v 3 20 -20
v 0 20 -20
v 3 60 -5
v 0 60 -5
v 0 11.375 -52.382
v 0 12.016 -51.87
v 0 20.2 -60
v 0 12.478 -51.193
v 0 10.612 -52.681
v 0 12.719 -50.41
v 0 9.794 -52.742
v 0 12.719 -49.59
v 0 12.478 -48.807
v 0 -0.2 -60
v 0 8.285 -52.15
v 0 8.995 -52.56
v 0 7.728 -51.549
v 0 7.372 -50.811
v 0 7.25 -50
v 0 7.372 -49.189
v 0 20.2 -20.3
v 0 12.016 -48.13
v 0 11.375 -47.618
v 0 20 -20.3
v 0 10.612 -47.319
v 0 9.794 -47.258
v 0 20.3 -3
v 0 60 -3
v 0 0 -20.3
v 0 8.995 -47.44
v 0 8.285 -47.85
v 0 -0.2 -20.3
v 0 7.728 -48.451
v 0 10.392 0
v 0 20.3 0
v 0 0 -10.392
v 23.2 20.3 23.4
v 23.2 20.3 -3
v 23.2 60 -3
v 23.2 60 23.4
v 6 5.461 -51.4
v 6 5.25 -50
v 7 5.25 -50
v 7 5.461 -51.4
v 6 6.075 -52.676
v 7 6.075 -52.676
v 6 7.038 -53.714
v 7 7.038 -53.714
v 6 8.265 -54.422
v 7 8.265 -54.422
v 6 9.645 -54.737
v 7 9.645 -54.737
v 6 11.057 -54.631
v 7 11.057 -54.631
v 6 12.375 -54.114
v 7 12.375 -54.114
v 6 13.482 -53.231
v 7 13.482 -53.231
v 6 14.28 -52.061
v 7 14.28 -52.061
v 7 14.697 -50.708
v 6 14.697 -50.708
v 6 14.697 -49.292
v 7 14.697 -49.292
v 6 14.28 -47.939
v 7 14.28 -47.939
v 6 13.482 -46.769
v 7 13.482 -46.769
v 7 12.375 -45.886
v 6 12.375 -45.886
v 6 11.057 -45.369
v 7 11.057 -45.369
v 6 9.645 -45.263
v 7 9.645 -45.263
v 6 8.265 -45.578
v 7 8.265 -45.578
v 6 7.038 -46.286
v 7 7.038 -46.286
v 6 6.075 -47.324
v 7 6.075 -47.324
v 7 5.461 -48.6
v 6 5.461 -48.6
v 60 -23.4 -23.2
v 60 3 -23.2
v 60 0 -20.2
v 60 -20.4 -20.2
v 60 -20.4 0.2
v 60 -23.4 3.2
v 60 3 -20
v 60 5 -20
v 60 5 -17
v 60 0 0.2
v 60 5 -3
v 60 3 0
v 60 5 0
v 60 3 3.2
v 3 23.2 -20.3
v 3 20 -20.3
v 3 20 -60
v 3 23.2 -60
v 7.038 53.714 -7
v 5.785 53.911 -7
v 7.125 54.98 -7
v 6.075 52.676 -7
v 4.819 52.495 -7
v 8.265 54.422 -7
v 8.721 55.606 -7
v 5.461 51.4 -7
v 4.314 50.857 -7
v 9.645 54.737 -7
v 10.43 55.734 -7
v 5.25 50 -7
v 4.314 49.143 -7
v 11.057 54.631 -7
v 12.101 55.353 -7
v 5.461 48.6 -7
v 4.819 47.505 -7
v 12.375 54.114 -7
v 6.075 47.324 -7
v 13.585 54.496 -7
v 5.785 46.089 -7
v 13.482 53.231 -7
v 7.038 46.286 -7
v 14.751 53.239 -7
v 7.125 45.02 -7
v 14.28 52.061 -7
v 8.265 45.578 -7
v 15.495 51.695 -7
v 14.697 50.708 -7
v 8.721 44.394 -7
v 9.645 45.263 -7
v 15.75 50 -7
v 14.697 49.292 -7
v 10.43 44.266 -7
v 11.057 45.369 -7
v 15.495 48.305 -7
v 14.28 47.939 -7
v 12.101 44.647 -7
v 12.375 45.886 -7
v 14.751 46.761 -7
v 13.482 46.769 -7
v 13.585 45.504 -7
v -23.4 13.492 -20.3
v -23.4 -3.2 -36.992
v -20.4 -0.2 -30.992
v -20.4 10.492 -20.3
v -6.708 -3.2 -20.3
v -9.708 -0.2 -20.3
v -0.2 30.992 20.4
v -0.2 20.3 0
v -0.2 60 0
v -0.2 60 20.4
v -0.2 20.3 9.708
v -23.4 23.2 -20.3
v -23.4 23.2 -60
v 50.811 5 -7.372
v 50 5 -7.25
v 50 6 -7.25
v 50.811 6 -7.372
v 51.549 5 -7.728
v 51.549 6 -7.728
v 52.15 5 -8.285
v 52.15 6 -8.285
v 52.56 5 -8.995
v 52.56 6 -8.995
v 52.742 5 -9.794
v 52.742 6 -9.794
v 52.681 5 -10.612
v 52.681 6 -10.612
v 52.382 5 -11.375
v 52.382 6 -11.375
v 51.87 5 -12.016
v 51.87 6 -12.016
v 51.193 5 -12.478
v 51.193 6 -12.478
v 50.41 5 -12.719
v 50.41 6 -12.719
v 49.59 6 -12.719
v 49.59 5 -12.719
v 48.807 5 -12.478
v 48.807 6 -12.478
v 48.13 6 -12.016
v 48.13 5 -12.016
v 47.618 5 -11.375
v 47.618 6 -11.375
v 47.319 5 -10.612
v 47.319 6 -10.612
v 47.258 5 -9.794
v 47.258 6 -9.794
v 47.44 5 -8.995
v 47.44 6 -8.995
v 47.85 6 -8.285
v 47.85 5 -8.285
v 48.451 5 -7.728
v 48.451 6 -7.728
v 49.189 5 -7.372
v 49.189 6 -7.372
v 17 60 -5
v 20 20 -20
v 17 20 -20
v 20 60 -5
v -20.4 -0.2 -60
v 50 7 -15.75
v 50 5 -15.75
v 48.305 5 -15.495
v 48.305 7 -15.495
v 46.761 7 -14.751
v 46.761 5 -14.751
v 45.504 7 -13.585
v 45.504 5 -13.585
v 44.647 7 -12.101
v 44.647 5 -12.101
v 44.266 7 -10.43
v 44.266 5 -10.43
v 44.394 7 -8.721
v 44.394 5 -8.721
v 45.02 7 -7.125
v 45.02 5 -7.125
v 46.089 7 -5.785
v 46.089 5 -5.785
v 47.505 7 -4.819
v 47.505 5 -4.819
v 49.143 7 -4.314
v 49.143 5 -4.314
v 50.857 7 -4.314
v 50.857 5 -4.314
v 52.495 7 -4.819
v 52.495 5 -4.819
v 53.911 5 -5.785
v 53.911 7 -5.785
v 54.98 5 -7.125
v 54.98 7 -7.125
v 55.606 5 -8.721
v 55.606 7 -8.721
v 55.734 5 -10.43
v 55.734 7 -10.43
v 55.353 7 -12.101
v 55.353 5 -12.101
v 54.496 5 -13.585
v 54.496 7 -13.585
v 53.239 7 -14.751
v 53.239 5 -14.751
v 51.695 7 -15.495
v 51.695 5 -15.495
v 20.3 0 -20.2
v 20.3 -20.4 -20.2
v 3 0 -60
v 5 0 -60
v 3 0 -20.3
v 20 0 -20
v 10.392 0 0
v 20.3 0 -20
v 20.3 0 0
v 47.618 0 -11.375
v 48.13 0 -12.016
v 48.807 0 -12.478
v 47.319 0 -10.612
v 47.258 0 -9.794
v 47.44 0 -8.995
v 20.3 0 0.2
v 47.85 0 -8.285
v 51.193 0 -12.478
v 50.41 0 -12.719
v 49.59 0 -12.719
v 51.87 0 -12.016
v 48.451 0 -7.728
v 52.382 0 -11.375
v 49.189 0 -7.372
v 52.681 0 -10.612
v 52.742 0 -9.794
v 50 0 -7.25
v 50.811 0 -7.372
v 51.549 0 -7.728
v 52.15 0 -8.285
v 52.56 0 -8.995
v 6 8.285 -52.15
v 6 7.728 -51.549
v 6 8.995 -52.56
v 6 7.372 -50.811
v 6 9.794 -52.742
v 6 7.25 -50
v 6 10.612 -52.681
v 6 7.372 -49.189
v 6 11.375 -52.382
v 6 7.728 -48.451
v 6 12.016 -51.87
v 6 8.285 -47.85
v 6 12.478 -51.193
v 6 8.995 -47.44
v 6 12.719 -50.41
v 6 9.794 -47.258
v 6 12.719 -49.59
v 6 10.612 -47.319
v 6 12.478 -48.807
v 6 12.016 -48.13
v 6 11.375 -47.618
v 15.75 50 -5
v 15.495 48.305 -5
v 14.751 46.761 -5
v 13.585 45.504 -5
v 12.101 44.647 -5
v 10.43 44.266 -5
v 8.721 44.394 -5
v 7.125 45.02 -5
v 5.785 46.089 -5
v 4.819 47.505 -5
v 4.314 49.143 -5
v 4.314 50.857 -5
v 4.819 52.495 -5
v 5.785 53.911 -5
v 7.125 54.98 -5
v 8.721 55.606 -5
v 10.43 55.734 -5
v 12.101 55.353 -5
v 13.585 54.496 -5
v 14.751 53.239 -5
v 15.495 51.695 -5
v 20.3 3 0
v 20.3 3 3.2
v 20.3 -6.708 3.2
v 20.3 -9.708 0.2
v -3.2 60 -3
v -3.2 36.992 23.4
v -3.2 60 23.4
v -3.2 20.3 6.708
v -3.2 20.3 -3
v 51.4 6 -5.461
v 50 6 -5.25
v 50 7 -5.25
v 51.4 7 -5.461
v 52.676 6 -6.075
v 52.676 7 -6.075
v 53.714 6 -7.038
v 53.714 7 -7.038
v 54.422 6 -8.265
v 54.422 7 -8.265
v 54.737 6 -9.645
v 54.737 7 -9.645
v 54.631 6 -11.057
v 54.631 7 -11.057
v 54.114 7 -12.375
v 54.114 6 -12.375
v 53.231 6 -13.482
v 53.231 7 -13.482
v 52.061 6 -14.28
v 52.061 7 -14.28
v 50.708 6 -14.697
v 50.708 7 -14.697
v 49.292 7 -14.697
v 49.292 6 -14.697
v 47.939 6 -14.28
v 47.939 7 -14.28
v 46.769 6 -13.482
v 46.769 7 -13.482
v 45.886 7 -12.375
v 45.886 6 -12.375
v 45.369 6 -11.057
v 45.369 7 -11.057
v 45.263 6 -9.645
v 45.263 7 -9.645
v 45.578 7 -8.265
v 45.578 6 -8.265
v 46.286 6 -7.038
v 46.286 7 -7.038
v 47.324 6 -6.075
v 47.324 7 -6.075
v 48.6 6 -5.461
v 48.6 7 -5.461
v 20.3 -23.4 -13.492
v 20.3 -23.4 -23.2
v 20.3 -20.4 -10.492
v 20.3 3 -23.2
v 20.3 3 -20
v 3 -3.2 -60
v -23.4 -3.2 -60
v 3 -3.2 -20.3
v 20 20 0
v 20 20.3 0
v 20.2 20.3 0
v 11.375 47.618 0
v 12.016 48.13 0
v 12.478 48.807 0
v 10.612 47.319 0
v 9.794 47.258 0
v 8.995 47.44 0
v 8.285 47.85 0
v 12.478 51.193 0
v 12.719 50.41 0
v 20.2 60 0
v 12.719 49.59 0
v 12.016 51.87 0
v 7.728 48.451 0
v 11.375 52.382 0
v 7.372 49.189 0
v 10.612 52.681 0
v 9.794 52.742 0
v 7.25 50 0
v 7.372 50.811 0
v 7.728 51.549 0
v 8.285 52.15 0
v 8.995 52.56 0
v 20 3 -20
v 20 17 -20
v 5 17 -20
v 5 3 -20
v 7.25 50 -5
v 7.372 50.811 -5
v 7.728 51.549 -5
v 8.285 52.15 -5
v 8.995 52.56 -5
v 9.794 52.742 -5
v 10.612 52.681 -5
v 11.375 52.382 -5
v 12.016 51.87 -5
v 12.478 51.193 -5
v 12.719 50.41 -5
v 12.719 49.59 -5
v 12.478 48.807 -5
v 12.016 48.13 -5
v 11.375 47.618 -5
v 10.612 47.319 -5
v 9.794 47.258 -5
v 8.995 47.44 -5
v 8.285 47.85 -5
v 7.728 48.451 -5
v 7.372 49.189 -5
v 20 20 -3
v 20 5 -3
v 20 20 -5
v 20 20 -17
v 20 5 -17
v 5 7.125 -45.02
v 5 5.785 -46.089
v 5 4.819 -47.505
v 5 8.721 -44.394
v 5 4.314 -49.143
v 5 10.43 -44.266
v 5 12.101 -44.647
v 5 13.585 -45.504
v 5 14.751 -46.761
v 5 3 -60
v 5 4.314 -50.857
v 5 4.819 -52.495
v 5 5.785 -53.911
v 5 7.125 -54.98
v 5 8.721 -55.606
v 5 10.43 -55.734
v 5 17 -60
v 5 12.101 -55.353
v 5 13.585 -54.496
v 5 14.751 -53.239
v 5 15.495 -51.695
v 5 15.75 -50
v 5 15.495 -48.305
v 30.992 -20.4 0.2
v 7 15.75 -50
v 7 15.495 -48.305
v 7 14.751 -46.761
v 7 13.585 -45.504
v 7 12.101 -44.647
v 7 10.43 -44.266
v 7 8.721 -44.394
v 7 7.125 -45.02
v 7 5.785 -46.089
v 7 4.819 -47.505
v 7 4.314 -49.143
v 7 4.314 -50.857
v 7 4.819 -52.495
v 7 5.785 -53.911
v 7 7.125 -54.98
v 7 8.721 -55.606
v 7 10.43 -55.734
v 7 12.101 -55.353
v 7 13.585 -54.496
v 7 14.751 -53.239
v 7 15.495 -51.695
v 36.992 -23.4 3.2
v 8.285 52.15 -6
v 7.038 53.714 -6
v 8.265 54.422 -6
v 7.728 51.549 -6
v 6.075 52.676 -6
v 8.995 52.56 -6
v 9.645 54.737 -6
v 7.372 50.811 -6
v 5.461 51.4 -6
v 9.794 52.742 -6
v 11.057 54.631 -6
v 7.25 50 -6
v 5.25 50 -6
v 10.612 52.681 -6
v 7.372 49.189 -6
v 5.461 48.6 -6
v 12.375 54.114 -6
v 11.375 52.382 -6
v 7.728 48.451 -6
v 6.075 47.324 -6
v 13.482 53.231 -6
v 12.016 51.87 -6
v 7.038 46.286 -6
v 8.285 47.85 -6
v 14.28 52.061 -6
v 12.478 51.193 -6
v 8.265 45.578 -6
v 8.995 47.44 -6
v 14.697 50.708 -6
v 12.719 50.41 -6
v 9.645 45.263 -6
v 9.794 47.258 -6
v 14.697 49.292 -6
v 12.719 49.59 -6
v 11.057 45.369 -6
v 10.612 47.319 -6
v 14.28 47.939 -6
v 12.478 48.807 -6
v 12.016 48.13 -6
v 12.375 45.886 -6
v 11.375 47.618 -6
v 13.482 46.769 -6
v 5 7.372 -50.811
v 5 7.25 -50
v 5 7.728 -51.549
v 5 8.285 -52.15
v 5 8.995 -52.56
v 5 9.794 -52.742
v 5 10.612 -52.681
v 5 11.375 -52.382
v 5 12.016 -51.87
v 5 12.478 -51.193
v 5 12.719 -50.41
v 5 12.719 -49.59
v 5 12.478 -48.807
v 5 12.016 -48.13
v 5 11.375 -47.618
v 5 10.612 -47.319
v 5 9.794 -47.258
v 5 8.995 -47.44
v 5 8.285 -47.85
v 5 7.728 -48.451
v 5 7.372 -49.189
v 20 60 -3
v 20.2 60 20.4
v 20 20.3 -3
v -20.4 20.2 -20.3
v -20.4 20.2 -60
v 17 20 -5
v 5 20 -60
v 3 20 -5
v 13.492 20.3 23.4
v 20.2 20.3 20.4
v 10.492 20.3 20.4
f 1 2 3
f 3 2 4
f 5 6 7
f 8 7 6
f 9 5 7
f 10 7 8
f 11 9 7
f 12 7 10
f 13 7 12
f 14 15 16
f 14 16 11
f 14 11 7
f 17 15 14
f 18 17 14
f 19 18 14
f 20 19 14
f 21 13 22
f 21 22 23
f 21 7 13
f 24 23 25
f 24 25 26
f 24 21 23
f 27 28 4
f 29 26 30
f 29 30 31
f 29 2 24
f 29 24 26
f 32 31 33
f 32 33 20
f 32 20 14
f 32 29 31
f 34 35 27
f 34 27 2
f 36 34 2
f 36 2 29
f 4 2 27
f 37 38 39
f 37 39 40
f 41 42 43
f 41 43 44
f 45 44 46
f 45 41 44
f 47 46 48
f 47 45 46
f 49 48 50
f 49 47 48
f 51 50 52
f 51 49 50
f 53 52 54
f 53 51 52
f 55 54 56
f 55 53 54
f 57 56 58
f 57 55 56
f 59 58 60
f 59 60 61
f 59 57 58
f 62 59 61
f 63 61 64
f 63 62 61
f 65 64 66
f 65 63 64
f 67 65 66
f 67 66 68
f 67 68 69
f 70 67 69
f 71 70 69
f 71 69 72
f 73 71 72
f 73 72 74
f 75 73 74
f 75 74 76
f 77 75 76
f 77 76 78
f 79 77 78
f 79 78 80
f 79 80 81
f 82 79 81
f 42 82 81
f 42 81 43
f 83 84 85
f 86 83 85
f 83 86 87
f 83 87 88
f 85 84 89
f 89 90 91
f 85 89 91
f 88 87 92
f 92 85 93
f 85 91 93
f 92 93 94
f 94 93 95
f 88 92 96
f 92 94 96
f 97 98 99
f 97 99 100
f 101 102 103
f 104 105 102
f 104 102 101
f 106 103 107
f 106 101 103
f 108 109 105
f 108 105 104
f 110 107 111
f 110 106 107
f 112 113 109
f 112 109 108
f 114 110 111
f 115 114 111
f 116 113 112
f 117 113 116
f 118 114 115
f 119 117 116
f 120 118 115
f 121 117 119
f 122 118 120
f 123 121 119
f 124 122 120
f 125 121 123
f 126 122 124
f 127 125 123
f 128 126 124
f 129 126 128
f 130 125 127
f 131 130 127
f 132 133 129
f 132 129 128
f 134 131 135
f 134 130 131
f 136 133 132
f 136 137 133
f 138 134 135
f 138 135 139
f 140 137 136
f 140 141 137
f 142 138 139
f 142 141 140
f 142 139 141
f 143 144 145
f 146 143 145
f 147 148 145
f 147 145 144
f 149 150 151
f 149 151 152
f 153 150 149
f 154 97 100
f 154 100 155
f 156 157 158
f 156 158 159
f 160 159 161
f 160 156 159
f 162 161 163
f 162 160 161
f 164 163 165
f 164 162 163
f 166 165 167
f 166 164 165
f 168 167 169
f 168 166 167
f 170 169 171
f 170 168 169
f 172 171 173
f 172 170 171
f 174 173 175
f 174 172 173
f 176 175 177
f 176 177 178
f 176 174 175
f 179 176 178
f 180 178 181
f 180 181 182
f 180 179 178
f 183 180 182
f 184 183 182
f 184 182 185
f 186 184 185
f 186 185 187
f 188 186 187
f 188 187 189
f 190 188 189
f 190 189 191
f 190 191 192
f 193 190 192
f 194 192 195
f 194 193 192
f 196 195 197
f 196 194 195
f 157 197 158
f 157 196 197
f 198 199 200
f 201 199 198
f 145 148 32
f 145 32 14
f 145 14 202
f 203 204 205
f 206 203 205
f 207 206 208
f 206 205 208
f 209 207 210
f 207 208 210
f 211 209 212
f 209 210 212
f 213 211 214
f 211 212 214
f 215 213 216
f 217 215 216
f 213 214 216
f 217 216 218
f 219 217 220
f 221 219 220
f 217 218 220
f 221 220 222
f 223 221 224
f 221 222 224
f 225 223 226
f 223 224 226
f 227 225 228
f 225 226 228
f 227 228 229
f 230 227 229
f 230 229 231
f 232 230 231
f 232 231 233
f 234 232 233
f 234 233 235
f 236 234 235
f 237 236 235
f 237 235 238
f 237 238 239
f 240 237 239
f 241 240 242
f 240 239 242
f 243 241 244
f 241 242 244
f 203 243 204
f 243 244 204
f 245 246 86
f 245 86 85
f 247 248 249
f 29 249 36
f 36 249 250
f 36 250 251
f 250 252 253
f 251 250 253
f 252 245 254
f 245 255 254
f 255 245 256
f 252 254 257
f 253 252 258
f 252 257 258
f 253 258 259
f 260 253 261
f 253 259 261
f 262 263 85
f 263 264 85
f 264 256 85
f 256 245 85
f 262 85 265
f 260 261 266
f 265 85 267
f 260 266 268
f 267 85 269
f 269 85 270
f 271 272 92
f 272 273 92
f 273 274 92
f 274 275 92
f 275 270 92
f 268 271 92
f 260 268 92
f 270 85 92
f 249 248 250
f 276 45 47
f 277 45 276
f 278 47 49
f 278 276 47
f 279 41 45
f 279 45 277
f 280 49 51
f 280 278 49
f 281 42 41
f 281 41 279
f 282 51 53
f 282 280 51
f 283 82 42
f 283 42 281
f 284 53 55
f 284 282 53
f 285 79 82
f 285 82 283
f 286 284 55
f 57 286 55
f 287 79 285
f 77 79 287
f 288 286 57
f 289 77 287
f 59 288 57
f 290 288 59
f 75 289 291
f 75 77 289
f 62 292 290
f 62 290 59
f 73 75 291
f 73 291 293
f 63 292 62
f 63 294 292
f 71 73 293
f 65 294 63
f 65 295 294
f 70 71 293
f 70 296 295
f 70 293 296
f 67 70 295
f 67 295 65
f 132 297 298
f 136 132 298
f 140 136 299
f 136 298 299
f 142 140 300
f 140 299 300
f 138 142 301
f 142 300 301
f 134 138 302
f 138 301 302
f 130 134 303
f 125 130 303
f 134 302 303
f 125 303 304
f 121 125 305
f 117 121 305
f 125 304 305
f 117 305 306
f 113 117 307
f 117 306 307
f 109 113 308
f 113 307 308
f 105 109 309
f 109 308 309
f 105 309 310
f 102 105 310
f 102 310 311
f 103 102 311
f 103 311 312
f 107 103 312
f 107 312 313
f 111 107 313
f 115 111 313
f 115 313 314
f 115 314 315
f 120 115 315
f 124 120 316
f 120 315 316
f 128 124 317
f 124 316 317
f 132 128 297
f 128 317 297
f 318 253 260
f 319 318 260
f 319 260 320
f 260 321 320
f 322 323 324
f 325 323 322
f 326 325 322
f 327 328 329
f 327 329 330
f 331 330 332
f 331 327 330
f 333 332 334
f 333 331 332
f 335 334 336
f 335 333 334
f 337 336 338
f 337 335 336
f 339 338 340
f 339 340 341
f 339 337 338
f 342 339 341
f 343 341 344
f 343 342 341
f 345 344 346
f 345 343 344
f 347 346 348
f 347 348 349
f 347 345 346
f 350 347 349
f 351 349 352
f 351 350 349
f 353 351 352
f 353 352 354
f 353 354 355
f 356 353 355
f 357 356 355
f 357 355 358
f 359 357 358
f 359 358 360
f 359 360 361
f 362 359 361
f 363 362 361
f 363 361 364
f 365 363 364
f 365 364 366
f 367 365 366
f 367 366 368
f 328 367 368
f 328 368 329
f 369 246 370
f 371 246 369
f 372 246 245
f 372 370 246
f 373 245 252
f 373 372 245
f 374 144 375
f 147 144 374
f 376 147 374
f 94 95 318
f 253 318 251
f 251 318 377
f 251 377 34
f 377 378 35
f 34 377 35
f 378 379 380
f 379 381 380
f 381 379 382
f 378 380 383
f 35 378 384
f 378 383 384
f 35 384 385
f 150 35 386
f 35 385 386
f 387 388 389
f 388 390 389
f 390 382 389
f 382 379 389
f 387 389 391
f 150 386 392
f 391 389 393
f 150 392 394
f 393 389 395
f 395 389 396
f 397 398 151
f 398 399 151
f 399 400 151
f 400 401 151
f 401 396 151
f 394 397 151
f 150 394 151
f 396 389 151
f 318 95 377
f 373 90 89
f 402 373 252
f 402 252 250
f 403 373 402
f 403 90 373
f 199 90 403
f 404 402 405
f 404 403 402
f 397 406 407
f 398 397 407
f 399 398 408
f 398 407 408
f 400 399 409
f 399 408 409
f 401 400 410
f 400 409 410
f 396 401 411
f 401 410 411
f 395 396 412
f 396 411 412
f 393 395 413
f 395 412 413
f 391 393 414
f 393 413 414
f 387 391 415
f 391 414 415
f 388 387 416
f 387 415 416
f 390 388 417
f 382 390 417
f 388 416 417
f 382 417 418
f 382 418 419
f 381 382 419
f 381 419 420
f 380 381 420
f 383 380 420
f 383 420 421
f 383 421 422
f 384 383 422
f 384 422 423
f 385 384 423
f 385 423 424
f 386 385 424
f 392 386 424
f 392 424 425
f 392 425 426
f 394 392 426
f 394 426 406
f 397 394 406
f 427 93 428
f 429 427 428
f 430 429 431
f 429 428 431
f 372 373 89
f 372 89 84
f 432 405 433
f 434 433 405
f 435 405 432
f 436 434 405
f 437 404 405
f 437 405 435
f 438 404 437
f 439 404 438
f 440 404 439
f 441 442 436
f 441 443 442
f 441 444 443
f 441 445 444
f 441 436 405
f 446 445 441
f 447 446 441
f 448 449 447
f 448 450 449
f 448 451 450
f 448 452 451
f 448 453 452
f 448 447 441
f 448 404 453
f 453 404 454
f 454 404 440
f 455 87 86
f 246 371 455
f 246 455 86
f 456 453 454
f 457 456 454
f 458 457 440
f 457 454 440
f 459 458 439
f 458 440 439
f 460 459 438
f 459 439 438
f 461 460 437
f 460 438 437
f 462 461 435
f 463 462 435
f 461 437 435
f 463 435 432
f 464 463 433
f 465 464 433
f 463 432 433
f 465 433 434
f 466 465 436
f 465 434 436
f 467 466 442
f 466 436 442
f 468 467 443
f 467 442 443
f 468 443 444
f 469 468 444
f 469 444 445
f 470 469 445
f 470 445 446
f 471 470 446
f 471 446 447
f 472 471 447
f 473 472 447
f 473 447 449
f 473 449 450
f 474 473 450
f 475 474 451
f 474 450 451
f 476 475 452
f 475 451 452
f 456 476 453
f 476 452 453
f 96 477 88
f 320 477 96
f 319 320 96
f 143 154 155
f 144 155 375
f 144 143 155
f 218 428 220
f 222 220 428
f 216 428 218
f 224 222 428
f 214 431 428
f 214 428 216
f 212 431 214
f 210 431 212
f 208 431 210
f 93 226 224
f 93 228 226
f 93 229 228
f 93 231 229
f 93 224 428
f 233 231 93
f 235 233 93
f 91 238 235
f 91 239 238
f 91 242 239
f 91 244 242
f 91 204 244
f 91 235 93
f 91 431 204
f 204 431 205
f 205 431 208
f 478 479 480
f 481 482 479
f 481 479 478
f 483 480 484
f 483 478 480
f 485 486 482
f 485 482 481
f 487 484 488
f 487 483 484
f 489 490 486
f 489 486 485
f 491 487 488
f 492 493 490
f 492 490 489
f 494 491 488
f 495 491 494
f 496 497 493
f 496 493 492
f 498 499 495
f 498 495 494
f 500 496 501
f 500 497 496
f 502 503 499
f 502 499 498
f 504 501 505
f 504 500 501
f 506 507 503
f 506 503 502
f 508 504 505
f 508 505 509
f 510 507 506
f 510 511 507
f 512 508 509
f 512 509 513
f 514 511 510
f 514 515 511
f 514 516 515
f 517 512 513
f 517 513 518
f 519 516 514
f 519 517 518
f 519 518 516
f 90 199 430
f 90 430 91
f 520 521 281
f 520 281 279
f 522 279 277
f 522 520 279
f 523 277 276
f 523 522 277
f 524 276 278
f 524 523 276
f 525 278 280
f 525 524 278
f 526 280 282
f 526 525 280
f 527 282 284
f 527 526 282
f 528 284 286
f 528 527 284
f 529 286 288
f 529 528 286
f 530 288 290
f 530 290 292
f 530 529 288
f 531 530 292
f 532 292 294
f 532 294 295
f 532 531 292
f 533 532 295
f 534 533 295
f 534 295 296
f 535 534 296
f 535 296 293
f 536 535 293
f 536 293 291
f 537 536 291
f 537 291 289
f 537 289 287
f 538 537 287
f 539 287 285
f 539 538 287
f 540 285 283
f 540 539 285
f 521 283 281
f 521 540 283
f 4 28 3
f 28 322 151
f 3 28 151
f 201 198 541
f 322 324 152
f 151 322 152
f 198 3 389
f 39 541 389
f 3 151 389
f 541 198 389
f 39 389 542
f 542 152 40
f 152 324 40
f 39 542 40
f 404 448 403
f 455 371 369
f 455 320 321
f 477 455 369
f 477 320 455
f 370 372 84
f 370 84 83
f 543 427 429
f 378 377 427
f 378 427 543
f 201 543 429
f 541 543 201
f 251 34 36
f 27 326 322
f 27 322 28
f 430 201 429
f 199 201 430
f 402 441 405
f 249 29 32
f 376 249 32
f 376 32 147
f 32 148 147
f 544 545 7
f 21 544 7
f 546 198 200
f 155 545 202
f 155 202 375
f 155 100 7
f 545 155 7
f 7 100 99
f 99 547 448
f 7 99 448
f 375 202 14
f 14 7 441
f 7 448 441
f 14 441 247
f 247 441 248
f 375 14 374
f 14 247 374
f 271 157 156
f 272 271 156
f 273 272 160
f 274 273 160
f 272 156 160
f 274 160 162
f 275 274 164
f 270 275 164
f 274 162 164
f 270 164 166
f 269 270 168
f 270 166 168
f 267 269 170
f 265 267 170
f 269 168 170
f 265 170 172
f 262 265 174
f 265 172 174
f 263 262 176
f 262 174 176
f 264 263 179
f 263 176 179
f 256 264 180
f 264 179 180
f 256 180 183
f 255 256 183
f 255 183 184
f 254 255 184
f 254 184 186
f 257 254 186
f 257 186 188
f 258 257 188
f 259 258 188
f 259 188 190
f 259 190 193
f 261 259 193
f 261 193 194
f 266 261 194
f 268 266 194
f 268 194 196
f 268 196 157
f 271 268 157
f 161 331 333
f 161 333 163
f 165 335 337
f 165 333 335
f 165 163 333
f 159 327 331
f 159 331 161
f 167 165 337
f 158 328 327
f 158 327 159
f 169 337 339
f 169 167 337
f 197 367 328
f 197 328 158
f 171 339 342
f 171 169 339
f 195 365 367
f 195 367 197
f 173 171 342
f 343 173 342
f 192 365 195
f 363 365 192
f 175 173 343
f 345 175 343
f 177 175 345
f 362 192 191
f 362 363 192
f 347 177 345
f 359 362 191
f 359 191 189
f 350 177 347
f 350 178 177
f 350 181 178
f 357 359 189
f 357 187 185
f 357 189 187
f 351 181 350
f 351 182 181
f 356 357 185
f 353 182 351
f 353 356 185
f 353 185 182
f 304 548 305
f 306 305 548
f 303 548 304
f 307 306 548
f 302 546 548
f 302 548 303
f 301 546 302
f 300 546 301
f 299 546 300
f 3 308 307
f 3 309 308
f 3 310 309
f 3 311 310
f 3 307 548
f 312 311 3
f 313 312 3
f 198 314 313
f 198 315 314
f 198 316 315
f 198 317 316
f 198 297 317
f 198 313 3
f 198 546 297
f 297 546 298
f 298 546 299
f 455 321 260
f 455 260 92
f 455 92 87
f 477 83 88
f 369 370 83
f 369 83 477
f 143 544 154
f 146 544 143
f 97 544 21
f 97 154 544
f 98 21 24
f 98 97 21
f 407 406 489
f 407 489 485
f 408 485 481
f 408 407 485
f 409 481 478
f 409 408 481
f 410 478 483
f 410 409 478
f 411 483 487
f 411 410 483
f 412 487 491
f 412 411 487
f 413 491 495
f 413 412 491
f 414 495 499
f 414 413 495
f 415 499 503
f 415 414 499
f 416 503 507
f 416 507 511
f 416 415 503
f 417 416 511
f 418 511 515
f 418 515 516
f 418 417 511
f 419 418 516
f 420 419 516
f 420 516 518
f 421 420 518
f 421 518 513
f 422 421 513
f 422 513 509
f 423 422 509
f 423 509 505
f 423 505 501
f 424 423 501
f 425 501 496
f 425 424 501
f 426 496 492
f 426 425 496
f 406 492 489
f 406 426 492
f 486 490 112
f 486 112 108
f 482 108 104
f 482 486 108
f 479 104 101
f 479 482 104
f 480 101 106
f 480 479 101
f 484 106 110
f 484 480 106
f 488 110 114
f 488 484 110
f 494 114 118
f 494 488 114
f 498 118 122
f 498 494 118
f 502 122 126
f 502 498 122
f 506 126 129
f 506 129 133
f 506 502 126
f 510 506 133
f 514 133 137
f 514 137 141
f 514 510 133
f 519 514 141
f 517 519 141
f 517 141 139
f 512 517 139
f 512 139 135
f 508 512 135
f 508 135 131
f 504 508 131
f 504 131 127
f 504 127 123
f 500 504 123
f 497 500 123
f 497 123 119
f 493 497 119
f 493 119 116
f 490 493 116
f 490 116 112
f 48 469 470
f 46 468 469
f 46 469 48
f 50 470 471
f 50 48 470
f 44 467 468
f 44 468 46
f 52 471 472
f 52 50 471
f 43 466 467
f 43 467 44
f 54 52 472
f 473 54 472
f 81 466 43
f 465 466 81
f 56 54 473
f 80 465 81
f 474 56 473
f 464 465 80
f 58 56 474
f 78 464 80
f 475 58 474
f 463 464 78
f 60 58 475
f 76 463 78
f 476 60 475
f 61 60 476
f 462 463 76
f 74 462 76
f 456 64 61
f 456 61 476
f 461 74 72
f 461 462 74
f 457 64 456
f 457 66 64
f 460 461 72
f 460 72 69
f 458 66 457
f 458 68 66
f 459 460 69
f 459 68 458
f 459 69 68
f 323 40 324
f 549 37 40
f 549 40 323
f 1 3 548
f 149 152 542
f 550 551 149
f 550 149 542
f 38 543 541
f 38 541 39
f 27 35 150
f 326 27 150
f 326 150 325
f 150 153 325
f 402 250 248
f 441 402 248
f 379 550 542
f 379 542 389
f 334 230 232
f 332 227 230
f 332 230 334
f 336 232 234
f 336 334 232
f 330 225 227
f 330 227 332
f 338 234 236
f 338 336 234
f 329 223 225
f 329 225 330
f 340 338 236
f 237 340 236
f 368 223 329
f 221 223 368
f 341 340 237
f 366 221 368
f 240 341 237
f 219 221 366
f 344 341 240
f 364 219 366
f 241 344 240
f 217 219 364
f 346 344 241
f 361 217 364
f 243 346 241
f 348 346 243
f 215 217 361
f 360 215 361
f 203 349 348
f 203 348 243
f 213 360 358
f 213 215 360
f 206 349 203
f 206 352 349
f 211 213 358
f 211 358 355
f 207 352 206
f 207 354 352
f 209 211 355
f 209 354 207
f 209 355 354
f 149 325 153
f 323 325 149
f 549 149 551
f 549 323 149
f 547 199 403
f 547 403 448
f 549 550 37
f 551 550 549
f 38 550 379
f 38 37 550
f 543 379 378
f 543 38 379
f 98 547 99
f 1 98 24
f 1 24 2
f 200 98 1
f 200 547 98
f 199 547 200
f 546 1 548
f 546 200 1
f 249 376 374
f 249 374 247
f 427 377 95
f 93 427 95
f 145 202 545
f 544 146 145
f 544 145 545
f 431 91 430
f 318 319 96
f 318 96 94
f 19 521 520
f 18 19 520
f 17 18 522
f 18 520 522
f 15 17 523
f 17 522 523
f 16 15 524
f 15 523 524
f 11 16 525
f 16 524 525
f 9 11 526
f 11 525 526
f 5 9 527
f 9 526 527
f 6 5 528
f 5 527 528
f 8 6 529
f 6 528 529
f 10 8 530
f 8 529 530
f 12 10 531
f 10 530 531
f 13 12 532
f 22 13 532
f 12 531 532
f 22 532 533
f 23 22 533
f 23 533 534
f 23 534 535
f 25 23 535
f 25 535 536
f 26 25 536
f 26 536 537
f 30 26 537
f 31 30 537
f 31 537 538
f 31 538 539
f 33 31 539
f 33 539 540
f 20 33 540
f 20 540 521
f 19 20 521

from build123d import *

# Parameters (mm, degrees)
SKETCH1_W           = 20
SKETCH1_H           = 20
BOSS_EXTRUDE1_DEPTH = 20
SKETCH2_W           = 40
SKETCH2_H           = 20
BOSS_EXTRUDE2_DEPTH = 5
BOSS_EXTRUDE3_DEPTH = 3
BOSS_EXTRUDE4_START = -20
BOSS_EXTRUDE4_DEPTH = 3
SKETCH4_R           = 4.75
SKETCH4_R_2         = 2.75
BOSS_EXTRUDE5_DEPTH = 1
SKETCH4_3_R         = 2.75
CUT_EXTRUDE1_DEPTH  = 66
SKETCH4_4_R         = 5.75
SKETCH4_4_R_2       = 4.75
BOSS_EXTRUDE6_DEPTH = 2
BOSS_EXTRUDE7_START = -20.3
BOSS_EXTRUDE7_DEPTH = 39.7
CIRPATTERN1_COUNT   = 3


with BuildPart() as part:
    # Sketch1 → Boss-Extrude1 (new body)
    with BuildSketch(Plane(origin=(0, 0, 0), x_dir=(1, 0, 0), z_dir=(0, 1, 0))):
        with Locations((10, 10)):
            Rectangle(SKETCH1_W, SKETCH1_H)
    extrude(amount=BOSS_EXTRUDE1_DEPTH)

    # Sketch2 → Boss-Extrude2 (add)
    with BuildSketch(Plane(origin=(0, 0, 0), x_dir=(1, 0, 0), z_dir=(0, 1, 0))):
        with Locations((40, 10)):
            Rectangle(SKETCH2_W, SKETCH2_H)
    boss_extrude2 = extrude(amount=BOSS_EXTRUDE2_DEPTH)

    # Sketch3 → Boss-Extrude3 (add)
    with BuildSketch(Plane.XY):
        Polygon((20, 5), (20, 20), (60, 5), align=None)
    boss_extrude3 = extrude(amount=-BOSS_EXTRUDE3_DEPTH)

    # Sketch3<2> → Boss-Extrude4 (add)
    with BuildSketch(Plane.XY.offset(BOSS_EXTRUDE4_START)):
        Polygon((20, 5), (20, 20), (60, 5), align=None)
    boss_extrude4 = extrude(amount=BOSS_EXTRUDE4_DEPTH)

    # Sketch4 → Boss-Extrude5 (add)
    with BuildSketch(Plane(origin=(0, 5, 0), x_dir=(1, 0, 0), z_dir=(0, 1, 0))):
        with Locations(Location((50, 10, 0), (0, 0, 90))):
            Circle(SKETCH4_R)
        with Locations(Location((50, 10, 0), (0, 0, 270))):
            Circle(SKETCH4_R_2, mode=Mode.SUBTRACT)
    boss_extrude5 = extrude(amount=BOSS_EXTRUDE5_DEPTH)

    # Sketch4<3> → Cut-Extrude1 (cut, through all)
    with BuildSketch(Plane(origin=(0, 5, 0), x_dir=(1, 0, 0), z_dir=(0, 1, 0))):
        with Locations(Location((50, 10, 0), (0, 0, 270))):
            Circle(SKETCH4_3_R)
    cut_extrude1 = extrude(amount=-CUT_EXTRUDE1_DEPTH, mode=Mode.SUBTRACT)

    # Sketch4<4> → Boss-Extrude6 (add)
    with BuildSketch(Plane(origin=(0, 5, 0), x_dir=(1, 0, 0), z_dir=(0, 1, 0))):
        with Locations(Location((50, 10, 0), (0, 0, 90))):
            Circle(SKETCH4_4_R)
        with Locations(Location((50, 10, 0), (0, 0, 270))):
            Circle(SKETCH4_4_R_2, mode=Mode.SUBTRACT)
    boss_extrude6 = extrude(amount=BOSS_EXTRUDE6_DEPTH)

    # Sketch5 → Boss-Extrude7 (add)
    with BuildSketch(Plane.ZY.offset(BOSS_EXTRUDE7_START)):
        Polygon((-20.2, -20.4), (-20.2, 0), (-20, 0), (-20, 3), (-23.2, 3), (-23.2, -23.4), (3.2, -23.4), (3.2, 3), (0, 3), (0, 0), (0.2, 0), (0.2, -20.4), align=None)
    boss_extrude7 = extrude(amount=-BOSS_EXTRUDE7_DEPTH)

    # CirPattern1: Boss-Extrude2, Boss-Extrude3, Boss-Extrude4, Boss-Extrude5, Cut-Extrude1, Boss-Extrude6, Boss-Extrude7 ×3 about axis
    cirpattern1_axis = Axis((0, 0, 0), (0.5773502691896256, 0.5773502691896258, -0.5773502691896258))
    add([boss_extrude2.rotate(cirpattern1_axis, i * 360 / CIRPATTERN1_COUNT) for i in range(1, CIRPATTERN1_COUNT)])
    add([boss_extrude3.rotate(cirpattern1_axis, i * 360 / CIRPATTERN1_COUNT) for i in range(1, CIRPATTERN1_COUNT)])
    add([boss_extrude4.rotate(cirpattern1_axis, i * 360 / CIRPATTERN1_COUNT) for i in range(1, CIRPATTERN1_COUNT)])
    add([boss_extrude5.rotate(cirpattern1_axis, i * 360 / CIRPATTERN1_COUNT) for i in range(1, CIRPATTERN1_COUNT)])
    add([cut_extrude1.rotate(cirpattern1_axis, i * 360 / CIRPATTERN1_COUNT) for i in range(1, CIRPATTERN1_COUNT)], mode=Mode.SUBTRACT)
    add([boss_extrude6.rotate(cirpattern1_axis, i * 360 / CIRPATTERN1_COUNT) for i in range(1, CIRPATTERN1_COUNT)])
    add([boss_extrude7.rotate(cirpattern1_axis, i * 360 / CIRPATTERN1_COUNT) for i in range(1, CIRPATTERN1_COUNT)])

    # SurfaceCut1
    split(bisect_by=Plane(origin=(3.464101615, 3.464101615, -3.464101615), x_dir=(0.8164965809277263, -0.40824829046386285, 0.40824829046386285), z_dir=(-0.5773502691896255, -0.5773502691896256, 0.5773502691896262)), keep=Keep.BOTTOM)


solid = part.part
